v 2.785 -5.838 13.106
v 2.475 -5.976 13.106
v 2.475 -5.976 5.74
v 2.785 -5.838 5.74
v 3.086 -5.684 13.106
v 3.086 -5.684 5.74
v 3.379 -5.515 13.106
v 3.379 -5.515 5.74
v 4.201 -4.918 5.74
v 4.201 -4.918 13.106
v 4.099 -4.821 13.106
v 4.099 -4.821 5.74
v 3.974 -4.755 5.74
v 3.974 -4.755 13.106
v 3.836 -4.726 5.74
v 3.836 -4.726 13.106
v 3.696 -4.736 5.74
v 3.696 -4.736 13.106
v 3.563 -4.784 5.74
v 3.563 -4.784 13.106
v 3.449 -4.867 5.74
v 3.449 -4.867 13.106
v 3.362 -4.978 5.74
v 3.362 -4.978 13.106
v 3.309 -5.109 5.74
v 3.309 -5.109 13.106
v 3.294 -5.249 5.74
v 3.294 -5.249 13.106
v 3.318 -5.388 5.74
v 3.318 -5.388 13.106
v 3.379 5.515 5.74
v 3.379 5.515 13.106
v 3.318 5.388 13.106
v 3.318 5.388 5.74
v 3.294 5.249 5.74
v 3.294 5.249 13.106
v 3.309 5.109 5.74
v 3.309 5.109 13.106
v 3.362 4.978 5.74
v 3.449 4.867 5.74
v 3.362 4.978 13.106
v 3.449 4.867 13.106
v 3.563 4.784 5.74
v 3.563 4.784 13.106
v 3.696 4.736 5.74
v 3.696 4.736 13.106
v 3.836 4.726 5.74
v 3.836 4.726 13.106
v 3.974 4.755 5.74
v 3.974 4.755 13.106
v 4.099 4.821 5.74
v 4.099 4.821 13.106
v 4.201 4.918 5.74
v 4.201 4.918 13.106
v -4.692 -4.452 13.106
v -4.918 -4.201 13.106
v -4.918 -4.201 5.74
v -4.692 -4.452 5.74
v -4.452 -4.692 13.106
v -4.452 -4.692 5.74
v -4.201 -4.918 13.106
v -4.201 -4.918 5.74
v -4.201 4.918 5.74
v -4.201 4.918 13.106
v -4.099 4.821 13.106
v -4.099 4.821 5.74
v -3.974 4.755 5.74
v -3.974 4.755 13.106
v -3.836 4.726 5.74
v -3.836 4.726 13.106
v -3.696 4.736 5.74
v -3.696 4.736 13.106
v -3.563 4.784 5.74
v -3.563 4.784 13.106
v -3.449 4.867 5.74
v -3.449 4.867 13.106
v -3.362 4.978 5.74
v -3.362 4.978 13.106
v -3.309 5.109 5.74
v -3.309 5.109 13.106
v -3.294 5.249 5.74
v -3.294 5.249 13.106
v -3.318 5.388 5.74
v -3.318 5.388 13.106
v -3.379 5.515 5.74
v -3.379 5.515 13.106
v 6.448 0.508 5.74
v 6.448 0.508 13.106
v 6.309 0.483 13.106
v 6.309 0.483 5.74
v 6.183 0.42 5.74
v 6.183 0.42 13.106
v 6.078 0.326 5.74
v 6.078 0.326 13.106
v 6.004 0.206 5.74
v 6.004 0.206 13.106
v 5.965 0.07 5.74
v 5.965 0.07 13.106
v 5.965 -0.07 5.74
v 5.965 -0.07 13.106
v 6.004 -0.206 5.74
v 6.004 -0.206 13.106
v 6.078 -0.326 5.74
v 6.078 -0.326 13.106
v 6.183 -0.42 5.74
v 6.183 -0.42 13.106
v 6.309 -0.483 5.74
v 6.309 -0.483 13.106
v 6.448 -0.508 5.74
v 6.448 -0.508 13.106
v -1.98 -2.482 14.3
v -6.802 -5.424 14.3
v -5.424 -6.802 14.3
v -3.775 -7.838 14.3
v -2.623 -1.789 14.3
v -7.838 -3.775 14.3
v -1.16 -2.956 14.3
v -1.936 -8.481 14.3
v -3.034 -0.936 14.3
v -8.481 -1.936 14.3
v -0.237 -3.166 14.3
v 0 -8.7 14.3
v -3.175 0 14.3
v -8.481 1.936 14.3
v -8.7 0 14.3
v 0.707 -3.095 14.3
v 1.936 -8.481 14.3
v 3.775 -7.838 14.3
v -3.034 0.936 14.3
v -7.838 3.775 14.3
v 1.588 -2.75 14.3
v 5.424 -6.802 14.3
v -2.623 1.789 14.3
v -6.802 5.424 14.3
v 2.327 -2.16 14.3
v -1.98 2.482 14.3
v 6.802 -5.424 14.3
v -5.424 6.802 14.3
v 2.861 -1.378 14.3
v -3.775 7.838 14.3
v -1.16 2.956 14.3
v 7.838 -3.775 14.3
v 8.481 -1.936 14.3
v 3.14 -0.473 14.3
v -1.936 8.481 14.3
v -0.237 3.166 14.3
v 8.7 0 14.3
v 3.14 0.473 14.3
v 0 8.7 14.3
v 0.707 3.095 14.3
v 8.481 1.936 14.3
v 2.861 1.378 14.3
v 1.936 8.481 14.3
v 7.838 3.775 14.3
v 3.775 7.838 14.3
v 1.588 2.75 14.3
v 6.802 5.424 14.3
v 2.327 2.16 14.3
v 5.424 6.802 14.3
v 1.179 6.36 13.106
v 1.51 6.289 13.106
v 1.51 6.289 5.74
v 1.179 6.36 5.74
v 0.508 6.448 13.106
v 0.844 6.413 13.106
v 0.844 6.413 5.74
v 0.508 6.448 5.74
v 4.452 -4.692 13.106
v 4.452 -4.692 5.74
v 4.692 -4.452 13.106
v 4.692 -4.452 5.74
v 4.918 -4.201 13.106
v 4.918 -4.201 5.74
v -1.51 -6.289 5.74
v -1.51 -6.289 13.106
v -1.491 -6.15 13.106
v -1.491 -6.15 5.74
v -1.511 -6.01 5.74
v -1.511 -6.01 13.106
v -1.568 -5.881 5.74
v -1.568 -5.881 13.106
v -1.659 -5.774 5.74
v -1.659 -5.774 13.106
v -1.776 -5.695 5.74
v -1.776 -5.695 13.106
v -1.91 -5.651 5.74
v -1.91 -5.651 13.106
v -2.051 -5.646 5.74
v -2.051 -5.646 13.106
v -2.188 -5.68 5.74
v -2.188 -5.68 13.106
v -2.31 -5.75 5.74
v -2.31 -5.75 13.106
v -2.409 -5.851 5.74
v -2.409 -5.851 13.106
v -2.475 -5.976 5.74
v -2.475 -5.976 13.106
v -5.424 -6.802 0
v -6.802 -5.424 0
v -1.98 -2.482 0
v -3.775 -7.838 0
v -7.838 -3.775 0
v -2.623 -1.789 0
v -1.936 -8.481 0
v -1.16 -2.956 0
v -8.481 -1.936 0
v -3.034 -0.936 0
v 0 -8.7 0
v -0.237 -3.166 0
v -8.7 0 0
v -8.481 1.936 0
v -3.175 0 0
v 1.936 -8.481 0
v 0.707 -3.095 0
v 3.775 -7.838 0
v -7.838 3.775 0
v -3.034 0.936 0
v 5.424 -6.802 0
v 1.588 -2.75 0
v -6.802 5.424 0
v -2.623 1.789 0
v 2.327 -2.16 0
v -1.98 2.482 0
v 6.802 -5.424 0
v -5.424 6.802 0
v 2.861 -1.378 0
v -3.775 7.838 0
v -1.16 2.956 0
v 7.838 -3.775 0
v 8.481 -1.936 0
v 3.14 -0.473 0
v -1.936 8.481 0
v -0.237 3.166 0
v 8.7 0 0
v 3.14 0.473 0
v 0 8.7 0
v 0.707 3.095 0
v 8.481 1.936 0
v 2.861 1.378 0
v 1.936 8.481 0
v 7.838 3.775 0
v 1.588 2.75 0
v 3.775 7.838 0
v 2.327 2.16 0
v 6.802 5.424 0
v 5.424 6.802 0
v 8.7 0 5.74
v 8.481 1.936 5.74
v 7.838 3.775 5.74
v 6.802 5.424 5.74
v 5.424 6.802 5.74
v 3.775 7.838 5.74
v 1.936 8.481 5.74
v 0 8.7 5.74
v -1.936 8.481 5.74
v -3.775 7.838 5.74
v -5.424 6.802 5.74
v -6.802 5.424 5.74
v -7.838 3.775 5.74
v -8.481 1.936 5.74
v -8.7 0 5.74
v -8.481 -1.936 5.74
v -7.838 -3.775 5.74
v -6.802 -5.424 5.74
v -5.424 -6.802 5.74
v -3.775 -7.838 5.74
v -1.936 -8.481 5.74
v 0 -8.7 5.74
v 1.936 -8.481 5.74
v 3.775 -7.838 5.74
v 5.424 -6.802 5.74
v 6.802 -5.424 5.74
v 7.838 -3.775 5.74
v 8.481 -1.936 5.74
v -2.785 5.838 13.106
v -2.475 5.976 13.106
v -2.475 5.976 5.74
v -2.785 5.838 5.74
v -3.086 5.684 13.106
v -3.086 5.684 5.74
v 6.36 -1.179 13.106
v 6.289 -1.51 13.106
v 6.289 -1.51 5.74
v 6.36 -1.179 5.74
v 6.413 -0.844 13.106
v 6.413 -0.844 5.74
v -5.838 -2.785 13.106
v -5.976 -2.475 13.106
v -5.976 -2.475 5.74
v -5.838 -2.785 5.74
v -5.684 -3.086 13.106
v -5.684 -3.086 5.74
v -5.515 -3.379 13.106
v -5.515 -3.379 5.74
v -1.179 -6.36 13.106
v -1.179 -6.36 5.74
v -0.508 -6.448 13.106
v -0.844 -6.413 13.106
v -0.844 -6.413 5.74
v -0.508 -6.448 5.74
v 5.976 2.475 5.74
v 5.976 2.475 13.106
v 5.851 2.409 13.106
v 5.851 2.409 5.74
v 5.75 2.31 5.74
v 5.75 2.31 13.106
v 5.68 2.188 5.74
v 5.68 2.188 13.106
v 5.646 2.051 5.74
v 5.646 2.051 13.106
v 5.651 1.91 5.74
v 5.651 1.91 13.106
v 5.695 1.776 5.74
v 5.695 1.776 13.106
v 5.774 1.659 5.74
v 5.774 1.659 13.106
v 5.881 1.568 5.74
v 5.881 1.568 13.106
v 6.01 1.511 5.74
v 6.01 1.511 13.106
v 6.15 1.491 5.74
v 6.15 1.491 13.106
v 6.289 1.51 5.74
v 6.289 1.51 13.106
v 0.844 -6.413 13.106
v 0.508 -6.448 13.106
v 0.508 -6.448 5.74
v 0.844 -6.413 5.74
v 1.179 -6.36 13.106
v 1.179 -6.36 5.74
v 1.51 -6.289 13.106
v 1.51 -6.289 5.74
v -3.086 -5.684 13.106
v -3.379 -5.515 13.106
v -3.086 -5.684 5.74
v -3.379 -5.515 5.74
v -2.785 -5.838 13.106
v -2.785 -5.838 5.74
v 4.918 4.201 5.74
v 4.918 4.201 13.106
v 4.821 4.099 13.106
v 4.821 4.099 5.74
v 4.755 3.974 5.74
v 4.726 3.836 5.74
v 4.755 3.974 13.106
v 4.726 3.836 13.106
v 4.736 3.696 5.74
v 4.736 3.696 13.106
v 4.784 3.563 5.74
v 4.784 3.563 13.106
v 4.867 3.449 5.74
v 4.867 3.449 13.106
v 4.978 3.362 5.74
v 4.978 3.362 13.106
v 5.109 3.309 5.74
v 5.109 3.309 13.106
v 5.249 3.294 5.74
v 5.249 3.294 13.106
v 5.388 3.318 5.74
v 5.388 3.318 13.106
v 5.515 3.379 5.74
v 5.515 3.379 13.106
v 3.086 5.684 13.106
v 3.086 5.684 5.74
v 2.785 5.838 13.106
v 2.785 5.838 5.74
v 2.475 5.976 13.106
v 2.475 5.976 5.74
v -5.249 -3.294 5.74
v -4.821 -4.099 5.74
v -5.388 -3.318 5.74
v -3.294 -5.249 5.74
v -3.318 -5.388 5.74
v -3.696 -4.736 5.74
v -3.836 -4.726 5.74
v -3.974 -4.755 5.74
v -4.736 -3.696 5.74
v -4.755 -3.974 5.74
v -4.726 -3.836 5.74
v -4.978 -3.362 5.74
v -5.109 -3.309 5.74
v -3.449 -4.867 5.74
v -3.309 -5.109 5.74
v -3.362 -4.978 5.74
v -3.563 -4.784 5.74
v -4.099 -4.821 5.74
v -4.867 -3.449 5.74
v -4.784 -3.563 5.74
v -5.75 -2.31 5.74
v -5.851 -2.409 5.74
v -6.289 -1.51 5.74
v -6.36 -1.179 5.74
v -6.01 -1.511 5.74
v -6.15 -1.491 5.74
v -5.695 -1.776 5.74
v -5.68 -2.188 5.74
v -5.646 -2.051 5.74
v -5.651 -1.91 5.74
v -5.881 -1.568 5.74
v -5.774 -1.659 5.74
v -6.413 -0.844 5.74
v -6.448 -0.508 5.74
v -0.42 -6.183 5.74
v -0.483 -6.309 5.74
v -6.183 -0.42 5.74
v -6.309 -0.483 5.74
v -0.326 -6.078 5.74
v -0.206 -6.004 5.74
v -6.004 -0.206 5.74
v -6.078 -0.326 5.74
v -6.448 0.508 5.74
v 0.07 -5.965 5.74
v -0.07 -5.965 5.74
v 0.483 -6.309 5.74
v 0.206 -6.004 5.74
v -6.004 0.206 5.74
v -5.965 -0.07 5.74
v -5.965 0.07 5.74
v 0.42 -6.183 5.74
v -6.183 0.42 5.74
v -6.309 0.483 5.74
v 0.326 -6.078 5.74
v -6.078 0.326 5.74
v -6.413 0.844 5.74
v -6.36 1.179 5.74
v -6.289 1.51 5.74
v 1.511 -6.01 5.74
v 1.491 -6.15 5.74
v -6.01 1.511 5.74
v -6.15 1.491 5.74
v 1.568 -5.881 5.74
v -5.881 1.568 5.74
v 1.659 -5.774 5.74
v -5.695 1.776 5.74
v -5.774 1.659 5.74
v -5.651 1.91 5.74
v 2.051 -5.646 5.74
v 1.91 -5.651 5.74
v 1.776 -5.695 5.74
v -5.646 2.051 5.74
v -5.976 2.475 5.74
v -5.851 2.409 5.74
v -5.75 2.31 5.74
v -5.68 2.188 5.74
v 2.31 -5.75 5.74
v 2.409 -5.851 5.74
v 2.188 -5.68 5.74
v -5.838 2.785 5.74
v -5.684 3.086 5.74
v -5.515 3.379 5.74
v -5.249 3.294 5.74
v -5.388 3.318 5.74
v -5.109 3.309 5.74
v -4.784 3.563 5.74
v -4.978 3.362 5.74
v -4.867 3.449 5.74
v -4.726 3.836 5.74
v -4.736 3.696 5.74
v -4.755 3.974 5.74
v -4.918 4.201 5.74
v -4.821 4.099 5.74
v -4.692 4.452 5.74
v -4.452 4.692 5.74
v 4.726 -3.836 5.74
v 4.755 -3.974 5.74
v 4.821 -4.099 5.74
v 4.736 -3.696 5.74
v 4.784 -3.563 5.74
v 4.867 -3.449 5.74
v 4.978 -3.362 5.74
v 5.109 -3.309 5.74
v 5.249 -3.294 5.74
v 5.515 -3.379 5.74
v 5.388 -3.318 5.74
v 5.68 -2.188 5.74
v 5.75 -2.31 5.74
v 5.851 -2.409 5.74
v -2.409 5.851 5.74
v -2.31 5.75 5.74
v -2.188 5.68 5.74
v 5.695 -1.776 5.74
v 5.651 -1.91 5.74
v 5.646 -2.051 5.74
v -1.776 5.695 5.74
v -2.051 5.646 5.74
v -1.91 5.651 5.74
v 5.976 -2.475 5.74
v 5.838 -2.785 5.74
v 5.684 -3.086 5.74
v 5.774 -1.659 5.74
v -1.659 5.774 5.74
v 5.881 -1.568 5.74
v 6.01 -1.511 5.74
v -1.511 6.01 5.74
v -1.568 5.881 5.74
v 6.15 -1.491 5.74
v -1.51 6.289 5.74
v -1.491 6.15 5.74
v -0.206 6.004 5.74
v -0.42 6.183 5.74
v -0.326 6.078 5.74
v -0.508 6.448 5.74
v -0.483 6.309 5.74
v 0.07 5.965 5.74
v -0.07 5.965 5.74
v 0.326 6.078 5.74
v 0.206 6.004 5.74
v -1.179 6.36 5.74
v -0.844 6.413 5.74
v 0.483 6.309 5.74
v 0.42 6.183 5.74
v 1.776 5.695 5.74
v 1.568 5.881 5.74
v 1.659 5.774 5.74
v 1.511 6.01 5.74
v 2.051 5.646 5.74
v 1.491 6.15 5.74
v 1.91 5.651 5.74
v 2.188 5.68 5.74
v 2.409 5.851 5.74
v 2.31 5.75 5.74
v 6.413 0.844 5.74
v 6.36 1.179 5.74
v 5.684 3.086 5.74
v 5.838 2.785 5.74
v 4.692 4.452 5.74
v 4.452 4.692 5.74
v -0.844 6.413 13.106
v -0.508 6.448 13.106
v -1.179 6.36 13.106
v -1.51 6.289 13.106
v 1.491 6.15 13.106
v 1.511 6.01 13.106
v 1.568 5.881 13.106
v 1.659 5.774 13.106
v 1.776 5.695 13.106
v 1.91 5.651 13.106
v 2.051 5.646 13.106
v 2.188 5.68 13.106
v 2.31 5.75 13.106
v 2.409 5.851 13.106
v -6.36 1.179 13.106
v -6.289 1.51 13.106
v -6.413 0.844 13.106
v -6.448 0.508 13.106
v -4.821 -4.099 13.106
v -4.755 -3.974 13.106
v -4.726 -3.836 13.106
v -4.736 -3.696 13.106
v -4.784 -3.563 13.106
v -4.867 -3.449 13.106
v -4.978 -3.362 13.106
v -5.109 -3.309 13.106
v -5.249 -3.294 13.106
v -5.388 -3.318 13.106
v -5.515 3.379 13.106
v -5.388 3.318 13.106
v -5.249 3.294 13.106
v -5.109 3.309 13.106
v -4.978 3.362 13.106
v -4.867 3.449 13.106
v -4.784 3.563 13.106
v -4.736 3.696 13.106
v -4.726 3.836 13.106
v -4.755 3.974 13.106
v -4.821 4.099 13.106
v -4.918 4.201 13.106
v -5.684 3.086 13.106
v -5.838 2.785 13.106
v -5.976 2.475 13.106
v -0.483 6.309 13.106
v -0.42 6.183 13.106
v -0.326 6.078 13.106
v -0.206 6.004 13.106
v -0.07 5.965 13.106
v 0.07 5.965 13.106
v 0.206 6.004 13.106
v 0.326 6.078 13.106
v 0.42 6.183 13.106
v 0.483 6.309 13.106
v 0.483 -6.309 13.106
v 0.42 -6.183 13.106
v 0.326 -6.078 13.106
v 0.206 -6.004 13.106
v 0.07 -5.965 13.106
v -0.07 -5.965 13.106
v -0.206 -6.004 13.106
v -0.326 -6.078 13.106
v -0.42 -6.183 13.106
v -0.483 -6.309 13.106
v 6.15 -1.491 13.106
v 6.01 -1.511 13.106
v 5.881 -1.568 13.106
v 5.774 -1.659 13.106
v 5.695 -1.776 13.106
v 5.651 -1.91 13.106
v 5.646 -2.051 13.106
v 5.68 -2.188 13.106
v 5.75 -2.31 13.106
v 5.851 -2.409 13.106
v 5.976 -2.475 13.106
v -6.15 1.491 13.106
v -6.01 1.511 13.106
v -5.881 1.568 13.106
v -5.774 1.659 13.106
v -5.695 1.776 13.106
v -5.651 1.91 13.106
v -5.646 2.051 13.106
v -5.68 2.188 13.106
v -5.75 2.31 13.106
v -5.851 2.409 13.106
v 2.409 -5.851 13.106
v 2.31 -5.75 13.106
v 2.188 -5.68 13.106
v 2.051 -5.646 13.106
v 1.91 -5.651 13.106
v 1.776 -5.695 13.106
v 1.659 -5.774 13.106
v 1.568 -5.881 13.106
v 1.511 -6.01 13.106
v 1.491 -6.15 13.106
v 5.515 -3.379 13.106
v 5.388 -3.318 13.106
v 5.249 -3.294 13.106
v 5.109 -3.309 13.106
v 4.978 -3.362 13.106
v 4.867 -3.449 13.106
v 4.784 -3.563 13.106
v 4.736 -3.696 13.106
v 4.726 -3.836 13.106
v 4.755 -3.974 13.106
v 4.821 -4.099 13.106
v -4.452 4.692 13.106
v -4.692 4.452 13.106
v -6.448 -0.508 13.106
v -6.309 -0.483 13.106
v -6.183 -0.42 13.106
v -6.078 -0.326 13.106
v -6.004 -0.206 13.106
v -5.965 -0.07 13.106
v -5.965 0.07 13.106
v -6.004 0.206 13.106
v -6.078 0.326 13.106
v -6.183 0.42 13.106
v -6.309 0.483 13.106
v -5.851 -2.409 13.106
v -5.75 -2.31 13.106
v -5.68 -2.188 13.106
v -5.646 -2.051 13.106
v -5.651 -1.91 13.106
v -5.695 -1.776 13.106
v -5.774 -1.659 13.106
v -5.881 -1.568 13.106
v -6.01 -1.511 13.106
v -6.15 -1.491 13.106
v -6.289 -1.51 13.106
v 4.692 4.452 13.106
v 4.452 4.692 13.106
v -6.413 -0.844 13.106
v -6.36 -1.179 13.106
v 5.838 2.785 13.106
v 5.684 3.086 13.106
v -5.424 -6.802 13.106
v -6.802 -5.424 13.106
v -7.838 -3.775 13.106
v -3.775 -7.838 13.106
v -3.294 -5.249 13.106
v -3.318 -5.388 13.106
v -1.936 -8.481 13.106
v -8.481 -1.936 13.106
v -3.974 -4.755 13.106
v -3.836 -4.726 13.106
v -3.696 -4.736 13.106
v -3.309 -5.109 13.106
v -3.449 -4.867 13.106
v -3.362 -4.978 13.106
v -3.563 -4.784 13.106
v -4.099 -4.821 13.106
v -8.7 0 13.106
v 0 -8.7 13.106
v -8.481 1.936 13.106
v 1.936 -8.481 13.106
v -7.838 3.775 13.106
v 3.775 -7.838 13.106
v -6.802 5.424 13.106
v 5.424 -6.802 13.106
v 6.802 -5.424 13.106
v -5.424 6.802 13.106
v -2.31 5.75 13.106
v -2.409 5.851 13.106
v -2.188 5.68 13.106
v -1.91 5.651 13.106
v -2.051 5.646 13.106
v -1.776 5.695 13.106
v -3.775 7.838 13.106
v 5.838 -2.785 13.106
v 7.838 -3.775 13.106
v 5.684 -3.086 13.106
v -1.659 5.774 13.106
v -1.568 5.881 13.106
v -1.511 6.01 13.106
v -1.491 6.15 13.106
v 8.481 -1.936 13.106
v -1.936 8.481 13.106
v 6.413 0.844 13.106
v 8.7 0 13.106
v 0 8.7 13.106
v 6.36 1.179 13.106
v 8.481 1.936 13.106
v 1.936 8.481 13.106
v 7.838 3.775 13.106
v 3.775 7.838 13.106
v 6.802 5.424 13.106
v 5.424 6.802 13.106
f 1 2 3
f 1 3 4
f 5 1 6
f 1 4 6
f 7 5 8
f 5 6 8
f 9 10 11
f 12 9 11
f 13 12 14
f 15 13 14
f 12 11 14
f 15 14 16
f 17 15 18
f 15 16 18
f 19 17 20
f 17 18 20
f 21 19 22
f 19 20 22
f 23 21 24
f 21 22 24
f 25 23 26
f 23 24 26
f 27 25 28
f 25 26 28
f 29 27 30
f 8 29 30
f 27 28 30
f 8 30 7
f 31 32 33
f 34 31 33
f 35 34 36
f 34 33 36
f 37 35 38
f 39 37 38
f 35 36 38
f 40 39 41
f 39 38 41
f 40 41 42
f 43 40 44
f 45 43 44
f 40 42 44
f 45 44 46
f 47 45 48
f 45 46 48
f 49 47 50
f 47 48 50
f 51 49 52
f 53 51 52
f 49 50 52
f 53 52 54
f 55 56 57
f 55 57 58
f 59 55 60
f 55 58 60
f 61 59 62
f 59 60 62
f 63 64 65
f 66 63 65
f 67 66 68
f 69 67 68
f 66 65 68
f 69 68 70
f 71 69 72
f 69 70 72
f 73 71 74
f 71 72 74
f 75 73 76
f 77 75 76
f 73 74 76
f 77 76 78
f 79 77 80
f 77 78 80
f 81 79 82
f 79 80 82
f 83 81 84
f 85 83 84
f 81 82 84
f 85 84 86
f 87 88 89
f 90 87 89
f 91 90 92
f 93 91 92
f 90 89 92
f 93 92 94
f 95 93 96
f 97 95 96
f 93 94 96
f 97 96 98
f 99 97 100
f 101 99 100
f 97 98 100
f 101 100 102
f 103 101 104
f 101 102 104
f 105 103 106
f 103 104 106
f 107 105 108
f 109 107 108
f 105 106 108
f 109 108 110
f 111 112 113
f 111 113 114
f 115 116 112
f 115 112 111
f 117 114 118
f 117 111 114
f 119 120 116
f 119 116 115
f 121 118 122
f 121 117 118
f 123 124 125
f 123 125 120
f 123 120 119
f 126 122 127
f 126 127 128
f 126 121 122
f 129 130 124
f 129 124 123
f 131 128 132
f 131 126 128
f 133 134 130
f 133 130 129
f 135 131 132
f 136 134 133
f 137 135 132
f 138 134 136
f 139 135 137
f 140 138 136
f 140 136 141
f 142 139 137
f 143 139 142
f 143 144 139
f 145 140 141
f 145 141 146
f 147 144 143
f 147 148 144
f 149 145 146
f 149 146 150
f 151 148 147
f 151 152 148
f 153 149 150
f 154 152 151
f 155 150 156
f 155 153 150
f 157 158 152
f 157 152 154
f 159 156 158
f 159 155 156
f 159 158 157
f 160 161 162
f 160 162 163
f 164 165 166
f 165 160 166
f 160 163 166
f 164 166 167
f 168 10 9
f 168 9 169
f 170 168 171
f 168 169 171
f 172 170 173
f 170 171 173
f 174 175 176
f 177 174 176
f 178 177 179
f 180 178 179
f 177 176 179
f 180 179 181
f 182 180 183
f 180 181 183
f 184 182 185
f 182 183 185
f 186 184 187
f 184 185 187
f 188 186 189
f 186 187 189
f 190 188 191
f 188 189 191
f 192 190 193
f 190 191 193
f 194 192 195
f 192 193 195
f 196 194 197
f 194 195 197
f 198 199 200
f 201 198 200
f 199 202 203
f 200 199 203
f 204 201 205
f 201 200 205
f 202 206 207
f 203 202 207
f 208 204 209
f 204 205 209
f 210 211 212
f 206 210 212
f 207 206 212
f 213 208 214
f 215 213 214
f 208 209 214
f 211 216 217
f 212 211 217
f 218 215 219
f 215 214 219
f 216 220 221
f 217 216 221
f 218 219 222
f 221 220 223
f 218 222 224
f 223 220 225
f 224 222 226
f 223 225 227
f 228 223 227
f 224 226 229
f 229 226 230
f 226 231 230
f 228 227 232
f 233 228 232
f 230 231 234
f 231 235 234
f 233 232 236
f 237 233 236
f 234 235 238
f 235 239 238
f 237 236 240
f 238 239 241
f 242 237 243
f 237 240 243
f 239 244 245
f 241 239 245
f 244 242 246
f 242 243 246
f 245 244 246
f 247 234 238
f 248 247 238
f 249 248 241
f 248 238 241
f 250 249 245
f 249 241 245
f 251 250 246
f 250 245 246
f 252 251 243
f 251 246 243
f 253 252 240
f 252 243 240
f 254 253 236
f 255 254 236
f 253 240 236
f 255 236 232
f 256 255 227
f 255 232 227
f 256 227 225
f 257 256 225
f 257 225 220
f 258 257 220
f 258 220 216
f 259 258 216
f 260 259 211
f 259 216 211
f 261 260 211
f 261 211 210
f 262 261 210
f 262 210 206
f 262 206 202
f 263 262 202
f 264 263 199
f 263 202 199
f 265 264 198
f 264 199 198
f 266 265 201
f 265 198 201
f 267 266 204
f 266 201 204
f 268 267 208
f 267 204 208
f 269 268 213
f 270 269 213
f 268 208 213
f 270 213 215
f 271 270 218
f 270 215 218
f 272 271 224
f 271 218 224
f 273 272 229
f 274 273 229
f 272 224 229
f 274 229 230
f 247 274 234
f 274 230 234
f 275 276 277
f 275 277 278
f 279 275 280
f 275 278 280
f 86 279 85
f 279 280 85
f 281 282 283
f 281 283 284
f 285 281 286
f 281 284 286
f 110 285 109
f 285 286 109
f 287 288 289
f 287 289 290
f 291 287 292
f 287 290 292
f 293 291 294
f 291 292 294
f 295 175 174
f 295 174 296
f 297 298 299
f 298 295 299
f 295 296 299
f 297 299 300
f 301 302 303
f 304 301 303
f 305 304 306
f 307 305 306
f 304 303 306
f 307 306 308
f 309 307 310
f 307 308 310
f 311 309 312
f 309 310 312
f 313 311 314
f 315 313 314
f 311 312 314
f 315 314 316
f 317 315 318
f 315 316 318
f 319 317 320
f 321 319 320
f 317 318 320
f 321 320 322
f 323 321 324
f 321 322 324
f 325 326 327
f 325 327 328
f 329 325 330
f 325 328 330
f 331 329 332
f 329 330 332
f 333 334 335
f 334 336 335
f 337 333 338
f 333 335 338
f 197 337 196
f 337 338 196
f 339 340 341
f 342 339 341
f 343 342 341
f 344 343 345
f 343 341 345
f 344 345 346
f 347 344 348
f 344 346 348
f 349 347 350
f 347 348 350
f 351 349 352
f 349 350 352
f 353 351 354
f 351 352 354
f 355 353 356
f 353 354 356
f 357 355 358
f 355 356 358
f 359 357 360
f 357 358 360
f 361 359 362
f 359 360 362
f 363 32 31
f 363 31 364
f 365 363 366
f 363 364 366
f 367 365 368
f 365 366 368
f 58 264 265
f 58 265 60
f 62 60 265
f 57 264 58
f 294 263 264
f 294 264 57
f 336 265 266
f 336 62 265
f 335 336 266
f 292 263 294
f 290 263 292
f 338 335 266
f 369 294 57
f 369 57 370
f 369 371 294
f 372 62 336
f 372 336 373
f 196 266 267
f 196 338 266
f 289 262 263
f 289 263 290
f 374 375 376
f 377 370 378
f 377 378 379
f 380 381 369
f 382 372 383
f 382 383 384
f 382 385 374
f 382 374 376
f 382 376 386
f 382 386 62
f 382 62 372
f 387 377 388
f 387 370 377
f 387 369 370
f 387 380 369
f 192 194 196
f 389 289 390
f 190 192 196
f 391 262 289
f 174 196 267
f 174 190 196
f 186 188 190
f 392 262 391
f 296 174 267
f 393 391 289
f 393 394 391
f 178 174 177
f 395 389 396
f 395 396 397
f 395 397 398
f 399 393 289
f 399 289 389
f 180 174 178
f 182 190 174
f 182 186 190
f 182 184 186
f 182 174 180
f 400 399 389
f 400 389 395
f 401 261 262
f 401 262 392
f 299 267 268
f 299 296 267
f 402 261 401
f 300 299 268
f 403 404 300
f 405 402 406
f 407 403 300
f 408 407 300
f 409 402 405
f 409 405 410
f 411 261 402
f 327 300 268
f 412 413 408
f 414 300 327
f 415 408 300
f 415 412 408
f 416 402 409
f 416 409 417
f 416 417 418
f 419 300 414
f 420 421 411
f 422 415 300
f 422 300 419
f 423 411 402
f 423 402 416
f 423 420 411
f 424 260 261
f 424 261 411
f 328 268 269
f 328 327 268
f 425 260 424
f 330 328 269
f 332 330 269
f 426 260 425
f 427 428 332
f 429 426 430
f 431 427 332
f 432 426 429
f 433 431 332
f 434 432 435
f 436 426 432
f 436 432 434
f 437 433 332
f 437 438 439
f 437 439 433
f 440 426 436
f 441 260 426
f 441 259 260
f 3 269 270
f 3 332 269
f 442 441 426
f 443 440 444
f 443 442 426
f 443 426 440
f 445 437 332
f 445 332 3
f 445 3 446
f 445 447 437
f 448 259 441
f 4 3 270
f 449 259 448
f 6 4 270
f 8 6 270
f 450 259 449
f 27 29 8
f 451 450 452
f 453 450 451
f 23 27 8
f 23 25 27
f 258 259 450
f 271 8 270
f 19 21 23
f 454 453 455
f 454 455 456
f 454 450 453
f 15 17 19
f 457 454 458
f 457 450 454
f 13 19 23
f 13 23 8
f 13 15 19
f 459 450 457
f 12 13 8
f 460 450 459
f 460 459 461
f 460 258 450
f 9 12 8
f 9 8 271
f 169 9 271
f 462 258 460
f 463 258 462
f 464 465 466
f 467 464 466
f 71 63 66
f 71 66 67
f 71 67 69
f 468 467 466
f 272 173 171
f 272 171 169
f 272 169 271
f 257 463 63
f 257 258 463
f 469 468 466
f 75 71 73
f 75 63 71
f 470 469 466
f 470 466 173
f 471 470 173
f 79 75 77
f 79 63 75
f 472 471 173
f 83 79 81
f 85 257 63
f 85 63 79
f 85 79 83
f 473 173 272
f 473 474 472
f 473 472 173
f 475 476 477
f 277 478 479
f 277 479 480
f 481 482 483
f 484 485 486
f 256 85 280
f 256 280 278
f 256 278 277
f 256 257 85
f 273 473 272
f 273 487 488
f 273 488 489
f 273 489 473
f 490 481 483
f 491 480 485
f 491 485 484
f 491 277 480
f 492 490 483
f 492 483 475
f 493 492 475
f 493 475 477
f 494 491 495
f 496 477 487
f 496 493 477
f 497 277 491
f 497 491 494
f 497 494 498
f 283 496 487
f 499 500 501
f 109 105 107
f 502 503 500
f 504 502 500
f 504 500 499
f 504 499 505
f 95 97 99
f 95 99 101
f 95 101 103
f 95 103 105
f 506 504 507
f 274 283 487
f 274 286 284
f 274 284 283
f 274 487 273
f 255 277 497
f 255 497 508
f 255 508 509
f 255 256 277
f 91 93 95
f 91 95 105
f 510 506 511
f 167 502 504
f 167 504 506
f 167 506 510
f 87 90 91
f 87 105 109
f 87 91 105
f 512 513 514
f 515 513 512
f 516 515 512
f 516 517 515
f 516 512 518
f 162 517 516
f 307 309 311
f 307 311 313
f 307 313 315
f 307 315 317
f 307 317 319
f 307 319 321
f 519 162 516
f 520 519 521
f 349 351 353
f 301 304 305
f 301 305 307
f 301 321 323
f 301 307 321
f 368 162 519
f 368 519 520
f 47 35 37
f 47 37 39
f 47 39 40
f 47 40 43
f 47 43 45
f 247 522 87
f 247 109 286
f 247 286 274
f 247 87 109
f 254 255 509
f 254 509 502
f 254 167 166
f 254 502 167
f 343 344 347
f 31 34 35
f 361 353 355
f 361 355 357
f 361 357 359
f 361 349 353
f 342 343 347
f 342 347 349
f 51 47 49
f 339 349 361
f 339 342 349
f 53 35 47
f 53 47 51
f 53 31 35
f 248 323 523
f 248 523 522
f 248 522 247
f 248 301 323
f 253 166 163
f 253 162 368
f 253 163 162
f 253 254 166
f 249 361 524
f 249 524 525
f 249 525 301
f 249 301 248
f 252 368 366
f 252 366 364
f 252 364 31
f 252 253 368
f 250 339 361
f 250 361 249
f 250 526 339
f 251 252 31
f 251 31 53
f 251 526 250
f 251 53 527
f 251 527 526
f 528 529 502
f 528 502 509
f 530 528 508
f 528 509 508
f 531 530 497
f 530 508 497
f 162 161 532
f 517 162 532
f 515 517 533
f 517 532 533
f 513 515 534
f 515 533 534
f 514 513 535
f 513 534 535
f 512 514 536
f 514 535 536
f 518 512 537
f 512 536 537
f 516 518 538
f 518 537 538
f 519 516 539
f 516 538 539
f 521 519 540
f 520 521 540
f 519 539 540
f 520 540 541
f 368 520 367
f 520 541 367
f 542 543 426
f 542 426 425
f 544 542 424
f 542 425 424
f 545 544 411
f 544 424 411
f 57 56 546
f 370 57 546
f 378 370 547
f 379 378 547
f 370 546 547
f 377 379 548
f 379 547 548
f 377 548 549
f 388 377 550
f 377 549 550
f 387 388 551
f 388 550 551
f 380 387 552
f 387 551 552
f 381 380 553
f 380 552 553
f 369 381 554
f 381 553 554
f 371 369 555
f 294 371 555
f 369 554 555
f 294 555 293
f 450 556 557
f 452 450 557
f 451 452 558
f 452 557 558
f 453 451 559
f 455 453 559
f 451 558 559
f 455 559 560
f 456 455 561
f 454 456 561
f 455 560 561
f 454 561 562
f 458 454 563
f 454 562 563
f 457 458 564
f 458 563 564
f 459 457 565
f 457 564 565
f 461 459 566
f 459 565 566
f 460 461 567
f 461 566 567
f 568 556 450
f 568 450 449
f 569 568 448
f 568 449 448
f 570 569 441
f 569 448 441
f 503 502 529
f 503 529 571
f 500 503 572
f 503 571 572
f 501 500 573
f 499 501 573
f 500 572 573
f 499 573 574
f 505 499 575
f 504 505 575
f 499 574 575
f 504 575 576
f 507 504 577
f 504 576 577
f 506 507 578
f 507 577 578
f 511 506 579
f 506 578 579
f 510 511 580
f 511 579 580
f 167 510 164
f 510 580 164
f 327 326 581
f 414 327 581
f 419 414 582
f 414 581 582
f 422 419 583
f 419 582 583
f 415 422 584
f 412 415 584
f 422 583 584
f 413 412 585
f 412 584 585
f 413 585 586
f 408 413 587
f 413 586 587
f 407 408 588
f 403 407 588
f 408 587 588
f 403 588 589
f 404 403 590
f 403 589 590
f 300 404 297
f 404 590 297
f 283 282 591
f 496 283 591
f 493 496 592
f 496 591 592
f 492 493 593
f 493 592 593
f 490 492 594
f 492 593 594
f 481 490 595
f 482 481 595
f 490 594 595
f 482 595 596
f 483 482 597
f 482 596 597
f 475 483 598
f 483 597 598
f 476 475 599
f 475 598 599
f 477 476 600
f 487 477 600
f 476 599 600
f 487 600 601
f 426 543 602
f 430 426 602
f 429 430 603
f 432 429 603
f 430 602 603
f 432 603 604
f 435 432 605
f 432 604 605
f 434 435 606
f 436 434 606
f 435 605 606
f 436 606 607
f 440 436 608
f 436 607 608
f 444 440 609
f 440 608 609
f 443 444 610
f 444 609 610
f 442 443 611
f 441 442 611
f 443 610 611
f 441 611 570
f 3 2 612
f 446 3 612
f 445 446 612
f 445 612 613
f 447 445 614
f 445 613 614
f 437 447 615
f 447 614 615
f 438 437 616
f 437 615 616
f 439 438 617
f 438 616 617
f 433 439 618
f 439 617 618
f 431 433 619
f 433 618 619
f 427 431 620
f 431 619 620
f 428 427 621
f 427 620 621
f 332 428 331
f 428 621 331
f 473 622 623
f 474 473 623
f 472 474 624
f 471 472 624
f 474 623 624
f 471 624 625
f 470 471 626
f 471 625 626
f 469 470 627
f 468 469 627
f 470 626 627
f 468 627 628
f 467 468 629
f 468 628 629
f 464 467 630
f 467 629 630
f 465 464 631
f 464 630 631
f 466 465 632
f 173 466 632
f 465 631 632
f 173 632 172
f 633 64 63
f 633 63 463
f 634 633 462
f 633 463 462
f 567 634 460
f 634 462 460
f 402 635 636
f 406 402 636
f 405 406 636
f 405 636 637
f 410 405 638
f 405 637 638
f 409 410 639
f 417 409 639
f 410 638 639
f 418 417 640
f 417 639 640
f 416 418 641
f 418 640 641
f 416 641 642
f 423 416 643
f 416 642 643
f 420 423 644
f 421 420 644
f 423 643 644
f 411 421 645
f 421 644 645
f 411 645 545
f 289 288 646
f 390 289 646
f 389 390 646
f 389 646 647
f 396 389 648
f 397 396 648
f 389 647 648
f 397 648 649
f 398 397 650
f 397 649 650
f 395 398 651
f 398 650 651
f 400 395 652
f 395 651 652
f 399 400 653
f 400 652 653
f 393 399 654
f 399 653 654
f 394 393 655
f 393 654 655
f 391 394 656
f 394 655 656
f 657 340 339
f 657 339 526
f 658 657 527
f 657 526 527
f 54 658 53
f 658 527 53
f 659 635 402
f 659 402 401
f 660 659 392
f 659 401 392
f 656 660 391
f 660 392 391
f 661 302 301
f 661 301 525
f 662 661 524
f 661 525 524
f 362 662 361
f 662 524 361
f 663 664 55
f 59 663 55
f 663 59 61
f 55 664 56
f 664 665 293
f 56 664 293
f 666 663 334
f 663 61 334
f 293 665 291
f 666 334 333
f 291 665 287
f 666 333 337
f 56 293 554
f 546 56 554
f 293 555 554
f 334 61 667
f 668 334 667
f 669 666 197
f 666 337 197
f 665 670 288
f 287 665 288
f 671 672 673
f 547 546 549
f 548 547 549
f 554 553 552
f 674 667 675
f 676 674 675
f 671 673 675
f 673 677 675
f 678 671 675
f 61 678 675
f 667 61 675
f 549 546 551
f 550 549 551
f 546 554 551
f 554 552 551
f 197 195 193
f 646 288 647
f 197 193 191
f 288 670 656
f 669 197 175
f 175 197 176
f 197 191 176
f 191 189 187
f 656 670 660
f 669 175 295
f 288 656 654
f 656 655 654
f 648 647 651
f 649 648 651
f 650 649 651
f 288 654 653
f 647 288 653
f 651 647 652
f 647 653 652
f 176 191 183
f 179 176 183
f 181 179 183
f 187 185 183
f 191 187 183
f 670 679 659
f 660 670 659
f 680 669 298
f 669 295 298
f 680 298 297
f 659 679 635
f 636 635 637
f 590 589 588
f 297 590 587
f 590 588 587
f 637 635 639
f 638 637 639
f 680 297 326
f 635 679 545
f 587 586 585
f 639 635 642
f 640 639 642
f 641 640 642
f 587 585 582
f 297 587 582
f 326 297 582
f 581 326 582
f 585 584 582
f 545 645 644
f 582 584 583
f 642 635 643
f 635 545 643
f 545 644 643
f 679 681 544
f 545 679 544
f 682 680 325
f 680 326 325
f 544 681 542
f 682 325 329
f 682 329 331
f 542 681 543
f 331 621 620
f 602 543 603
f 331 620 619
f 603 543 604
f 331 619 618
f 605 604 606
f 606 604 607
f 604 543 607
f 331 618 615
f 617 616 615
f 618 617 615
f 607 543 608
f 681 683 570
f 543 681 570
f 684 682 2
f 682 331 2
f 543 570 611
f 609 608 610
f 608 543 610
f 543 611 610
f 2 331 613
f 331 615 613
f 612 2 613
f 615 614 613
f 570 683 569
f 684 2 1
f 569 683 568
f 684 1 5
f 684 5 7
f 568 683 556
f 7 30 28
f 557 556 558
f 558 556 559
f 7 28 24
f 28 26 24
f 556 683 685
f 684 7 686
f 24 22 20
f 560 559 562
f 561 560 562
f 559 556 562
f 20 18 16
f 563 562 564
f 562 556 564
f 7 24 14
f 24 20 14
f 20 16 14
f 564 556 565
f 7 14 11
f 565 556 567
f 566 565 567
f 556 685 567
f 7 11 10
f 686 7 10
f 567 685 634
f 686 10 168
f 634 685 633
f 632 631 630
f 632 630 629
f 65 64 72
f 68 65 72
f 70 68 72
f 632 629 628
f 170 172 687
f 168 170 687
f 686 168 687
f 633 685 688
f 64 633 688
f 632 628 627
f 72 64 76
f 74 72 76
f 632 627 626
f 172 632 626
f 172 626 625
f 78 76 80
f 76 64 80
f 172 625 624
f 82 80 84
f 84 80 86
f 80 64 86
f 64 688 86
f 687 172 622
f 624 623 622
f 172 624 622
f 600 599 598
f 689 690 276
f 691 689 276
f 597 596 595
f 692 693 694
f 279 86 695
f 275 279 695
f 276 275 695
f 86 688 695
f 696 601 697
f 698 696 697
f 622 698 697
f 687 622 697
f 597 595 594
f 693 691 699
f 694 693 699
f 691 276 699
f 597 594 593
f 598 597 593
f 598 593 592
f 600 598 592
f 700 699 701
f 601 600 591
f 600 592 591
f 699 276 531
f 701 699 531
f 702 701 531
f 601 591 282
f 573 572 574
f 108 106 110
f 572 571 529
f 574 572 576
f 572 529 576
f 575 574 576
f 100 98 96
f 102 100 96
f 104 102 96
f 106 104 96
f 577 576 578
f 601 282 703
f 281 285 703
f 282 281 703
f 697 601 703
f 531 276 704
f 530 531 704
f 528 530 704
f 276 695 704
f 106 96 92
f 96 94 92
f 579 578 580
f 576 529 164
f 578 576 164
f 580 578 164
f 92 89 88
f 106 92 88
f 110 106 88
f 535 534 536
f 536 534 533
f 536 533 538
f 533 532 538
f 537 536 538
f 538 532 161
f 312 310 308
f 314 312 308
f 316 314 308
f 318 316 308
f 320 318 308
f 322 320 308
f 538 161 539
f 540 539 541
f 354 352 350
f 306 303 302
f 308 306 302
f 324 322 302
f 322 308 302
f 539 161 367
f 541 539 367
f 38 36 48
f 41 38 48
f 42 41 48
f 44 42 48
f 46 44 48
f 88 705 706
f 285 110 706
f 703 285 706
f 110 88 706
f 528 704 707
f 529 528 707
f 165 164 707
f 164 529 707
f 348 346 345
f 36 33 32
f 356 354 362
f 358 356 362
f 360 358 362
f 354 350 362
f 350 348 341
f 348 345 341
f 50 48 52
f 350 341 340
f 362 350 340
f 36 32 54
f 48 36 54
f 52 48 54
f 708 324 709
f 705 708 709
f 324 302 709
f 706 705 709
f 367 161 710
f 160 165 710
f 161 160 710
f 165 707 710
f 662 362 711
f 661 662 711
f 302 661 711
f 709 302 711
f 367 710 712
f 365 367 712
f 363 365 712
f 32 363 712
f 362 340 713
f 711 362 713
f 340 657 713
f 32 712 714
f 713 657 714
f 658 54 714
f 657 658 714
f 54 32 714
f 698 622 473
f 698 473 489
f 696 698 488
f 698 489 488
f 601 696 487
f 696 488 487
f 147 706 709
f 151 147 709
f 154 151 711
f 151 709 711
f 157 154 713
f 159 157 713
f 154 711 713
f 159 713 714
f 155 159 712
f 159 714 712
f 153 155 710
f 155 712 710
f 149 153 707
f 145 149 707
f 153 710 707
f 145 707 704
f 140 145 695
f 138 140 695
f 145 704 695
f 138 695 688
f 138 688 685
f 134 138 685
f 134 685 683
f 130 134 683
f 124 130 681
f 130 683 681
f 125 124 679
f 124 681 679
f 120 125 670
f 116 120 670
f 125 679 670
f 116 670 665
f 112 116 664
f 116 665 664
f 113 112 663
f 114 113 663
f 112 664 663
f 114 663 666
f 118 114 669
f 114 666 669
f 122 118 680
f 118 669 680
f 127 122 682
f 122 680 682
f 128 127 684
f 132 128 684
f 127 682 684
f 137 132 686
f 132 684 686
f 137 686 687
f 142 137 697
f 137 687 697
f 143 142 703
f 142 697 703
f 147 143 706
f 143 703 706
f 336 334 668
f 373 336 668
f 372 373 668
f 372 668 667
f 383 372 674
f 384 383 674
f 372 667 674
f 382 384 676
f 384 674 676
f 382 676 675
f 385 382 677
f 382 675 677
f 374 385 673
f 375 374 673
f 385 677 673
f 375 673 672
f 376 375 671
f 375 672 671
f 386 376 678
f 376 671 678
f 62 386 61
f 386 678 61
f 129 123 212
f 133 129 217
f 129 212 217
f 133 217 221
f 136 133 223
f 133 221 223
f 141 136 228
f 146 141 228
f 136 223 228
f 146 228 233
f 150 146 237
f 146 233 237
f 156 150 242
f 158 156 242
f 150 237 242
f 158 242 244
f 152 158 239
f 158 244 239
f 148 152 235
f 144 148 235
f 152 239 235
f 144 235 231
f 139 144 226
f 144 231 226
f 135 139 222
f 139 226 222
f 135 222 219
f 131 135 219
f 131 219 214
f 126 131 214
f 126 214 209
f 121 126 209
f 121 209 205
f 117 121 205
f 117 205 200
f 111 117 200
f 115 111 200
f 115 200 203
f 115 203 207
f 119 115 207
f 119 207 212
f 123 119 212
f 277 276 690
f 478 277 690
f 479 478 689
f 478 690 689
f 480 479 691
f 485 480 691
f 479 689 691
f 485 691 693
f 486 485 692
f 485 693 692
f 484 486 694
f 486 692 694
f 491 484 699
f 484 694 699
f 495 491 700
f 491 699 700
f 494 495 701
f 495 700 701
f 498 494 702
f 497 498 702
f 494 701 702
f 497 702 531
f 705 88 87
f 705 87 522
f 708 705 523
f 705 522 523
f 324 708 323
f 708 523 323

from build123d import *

# Parameters (mm, degrees)
SKETCH1_R           = 8.6995
BOSS_EXTRUDE1_DEPTH = 5.7404
SKETCH2_R           = 6.468056998
BOSS_EXTRUDE2_DEPTH = 7.366
SKETCH3_R           = 0.508
CUT_EXTRUDE1_DEPTH  = 7.366
CIRPATTERN1_COUNT   = 20
SKETCH4_R           = 8.6995
BOSS_EXTRUDE3_DEPTH = 1.1938
SKETCH5_R           = 3.175
CUT_EXTRUDE2_DEPTH  = 15.3002


with BuildPart() as part:
    # Sketch1 → Boss-Extrude1 (new body)
    with BuildSketch(Plane.XY):
        Circle(SKETCH1_R)
    extrude(amount=BOSS_EXTRUDE1_DEPTH)

    # Sketch2 → Boss-Extrude2 (add)
    with BuildSketch(Plane.XY.offset(5.7404)):
        Circle(SKETCH2_R)
    extrude(amount=BOSS_EXTRUDE2_DEPTH)

    # Sketch3 → Cut-Extrude1 (cut)
    with BuildSketch(Plane.XY.offset(13.1064)):
        with Locations((0, 6.468056998)):
            Circle(SKETCH3_R)
    cut_extrude1 = extrude(amount=-CUT_EXTRUDE1_DEPTH, mode=Mode.SUBTRACT)

    # CirPattern1: Cut-Extrude1 ×20 about axis
    cirpattern1_axis = Axis((0, 0, 0), (0, 0, 1))
    for i in range(1, CIRPATTERN1_COUNT):
        add(cut_extrude1.rotate(cirpattern1_axis, i * 360 / CIRPATTERN1_COUNT), mode=Mode.SUBTRACT)

    # Sketch4 → Boss-Extrude3 (add)
    with BuildSketch(Plane.XY.offset(13.1064)):
        Circle(SKETCH4_R)
    extrude(amount=BOSS_EXTRUDE3_DEPTH)

    # Sketch5 → Cut-Extrude2 (cut, through all)
    with BuildSketch(Plane(origin=(0, 0, 0), x_dir=(-1, 0, 0), z_dir=(0, 0, -1))):
        Circle(SKETCH5_R)
    extrude(amount=-CUT_EXTRUDE2_DEPTH, mode=Mode.SUBTRACT)


solid = part.part
